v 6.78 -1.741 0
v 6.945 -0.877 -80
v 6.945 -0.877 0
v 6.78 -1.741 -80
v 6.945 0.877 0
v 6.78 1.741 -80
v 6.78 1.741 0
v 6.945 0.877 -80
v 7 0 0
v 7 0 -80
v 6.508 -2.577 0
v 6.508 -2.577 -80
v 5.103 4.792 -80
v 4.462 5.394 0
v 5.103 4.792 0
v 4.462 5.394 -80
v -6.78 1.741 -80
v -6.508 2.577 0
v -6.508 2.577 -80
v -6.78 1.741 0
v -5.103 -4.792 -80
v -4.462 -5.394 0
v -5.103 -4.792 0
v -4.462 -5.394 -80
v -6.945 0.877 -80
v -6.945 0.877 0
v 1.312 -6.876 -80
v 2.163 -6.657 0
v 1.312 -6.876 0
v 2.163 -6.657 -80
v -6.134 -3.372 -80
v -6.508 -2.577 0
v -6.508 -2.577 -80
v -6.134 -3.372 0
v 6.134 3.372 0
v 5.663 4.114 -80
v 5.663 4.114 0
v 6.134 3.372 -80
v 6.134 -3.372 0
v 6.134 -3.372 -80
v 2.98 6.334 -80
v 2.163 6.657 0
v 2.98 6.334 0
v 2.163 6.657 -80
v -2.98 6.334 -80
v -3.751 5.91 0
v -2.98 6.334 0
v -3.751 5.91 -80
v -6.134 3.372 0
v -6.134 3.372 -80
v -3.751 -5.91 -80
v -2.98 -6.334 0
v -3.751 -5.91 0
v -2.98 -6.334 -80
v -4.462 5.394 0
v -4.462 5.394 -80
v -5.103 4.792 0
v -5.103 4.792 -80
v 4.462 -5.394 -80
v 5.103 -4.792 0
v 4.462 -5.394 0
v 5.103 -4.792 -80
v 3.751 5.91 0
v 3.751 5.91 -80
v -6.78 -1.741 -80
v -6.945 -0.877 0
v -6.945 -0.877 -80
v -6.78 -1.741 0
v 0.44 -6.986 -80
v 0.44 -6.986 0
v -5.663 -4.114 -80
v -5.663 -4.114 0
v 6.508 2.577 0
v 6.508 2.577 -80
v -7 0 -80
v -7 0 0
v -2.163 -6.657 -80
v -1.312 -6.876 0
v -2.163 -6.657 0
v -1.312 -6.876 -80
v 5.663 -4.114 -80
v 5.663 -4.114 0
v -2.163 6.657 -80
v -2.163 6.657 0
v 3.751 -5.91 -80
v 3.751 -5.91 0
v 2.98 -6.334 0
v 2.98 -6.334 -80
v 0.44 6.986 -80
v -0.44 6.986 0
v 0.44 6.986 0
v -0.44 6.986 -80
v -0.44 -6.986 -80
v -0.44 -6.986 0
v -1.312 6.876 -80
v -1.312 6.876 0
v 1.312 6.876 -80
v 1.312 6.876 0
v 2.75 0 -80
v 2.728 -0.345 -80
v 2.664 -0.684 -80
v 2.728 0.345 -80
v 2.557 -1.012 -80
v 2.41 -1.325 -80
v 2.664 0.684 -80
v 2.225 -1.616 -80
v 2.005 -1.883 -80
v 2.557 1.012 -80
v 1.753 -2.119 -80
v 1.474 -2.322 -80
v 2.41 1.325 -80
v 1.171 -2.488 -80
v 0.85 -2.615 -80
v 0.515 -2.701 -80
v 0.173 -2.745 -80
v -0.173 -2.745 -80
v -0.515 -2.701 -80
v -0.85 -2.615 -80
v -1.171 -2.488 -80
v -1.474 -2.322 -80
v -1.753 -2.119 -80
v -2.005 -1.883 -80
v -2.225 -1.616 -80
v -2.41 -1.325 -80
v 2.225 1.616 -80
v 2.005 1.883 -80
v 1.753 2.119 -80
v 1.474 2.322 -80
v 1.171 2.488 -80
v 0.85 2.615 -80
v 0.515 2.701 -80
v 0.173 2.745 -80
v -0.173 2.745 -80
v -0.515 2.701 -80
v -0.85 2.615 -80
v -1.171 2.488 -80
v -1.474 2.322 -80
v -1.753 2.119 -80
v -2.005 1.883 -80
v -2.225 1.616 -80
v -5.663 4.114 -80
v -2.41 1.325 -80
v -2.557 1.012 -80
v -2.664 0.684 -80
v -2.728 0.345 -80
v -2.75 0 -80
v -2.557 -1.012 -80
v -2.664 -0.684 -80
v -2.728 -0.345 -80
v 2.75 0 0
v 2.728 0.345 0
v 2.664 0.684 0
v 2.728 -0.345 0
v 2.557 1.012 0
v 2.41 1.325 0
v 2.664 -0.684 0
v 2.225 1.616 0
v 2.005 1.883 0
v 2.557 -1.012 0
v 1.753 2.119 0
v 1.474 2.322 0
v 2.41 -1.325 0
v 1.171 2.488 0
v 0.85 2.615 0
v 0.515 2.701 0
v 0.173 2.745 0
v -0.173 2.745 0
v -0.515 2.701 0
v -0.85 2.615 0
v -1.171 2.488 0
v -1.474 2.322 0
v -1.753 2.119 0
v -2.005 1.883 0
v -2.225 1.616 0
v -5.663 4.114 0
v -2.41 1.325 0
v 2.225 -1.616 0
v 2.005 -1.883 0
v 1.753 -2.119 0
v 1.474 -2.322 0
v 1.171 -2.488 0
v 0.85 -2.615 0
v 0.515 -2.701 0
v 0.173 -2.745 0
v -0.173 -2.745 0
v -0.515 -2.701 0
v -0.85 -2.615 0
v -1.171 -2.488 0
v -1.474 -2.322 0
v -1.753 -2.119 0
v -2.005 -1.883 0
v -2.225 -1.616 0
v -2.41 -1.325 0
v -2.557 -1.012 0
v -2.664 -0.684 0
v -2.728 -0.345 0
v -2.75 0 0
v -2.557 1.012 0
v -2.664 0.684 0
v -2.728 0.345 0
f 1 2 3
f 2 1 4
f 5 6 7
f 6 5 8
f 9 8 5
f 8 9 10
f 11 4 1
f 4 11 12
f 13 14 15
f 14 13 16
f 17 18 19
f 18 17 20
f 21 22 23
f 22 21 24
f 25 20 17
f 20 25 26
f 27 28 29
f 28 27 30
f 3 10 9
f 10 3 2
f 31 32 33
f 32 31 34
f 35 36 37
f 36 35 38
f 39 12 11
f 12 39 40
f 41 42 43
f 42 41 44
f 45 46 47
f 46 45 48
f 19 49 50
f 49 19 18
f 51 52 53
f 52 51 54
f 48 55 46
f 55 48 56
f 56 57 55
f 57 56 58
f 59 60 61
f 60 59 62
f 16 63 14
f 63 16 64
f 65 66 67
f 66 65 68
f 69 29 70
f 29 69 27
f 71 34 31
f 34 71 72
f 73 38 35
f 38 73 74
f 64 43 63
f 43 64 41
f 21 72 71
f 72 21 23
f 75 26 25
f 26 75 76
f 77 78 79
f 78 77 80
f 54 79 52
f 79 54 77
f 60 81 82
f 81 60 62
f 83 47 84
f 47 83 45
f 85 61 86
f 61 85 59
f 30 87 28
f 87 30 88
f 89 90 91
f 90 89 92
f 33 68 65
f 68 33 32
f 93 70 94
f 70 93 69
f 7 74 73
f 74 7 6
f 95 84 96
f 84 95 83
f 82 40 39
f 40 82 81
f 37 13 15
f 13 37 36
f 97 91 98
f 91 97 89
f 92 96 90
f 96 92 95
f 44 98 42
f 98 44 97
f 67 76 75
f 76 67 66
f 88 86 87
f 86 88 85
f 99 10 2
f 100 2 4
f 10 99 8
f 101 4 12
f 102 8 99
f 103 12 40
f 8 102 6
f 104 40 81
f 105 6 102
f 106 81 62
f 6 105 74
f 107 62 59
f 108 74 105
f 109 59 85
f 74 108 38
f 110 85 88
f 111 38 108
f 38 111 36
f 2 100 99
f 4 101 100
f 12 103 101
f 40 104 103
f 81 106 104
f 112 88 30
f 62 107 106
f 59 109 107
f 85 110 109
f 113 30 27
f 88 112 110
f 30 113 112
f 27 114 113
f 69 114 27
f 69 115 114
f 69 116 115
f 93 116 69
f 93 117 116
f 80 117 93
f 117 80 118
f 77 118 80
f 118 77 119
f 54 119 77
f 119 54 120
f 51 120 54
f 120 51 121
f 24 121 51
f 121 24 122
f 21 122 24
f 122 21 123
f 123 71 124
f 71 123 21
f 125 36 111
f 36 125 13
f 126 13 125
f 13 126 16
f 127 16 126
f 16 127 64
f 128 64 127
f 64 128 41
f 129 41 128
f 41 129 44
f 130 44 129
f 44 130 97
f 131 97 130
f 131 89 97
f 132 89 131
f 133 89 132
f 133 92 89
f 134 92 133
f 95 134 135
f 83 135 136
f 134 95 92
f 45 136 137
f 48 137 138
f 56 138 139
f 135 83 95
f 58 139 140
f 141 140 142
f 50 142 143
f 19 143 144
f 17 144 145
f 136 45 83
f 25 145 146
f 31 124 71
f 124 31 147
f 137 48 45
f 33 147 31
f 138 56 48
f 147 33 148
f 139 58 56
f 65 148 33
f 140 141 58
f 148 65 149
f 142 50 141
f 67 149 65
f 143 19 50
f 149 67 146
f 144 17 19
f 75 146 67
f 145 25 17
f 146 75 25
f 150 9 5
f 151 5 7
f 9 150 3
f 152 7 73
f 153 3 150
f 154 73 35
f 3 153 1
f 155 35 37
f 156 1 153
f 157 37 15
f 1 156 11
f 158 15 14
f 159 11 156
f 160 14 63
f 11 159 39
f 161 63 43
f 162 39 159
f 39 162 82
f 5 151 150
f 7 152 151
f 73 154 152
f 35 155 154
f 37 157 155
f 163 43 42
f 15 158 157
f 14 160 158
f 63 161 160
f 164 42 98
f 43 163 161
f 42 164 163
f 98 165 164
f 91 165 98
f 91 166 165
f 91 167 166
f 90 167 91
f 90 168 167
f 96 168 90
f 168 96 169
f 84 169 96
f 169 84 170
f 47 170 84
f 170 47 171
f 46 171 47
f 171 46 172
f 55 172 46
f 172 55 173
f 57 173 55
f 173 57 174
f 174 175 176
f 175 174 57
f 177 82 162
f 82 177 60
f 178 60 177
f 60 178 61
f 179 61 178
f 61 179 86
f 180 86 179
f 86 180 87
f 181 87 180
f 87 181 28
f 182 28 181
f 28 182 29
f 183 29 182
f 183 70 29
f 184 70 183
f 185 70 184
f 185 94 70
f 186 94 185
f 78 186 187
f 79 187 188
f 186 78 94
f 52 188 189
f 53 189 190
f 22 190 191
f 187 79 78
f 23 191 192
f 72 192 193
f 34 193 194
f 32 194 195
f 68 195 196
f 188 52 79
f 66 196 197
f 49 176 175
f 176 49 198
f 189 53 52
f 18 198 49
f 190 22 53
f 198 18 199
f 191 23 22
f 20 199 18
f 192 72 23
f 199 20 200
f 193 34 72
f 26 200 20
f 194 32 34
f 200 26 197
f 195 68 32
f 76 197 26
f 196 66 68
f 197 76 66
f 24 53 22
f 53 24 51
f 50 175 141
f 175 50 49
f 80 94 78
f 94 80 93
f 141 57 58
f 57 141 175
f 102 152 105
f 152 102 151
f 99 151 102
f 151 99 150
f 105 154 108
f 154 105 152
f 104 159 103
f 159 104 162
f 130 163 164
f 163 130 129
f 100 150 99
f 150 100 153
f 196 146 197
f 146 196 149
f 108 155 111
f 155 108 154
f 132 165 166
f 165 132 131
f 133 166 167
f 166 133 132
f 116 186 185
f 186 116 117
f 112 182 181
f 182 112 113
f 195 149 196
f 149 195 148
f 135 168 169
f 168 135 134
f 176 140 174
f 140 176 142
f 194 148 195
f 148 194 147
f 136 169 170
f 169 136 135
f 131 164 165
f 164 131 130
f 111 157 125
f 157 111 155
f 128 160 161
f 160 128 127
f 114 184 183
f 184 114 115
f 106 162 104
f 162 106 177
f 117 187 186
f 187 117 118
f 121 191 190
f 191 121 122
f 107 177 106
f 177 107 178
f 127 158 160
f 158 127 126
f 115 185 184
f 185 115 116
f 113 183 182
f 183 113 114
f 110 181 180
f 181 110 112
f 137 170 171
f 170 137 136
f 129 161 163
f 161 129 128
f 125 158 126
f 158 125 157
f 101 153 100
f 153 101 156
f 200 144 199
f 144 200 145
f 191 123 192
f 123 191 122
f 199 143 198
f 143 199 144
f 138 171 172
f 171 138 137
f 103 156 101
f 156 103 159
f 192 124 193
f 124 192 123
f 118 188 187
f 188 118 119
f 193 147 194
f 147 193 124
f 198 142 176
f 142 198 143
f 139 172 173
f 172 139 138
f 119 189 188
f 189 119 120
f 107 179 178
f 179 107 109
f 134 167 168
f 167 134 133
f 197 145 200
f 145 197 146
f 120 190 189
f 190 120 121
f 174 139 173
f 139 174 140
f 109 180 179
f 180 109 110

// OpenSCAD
$fn = 50;


difference() {
	union() {
		translate(v = [0, 0, -80.0000000000]) {
			cylinder(h = 80, r = 7.0000000000);
		}
		cylinder(h = 0, r = 16.0000000000);
	}
	union() {
		#translate(v = [0, 0, -80]) {
			cylinder(h = 80, r = 2.7500000000);
		}
	}
}
